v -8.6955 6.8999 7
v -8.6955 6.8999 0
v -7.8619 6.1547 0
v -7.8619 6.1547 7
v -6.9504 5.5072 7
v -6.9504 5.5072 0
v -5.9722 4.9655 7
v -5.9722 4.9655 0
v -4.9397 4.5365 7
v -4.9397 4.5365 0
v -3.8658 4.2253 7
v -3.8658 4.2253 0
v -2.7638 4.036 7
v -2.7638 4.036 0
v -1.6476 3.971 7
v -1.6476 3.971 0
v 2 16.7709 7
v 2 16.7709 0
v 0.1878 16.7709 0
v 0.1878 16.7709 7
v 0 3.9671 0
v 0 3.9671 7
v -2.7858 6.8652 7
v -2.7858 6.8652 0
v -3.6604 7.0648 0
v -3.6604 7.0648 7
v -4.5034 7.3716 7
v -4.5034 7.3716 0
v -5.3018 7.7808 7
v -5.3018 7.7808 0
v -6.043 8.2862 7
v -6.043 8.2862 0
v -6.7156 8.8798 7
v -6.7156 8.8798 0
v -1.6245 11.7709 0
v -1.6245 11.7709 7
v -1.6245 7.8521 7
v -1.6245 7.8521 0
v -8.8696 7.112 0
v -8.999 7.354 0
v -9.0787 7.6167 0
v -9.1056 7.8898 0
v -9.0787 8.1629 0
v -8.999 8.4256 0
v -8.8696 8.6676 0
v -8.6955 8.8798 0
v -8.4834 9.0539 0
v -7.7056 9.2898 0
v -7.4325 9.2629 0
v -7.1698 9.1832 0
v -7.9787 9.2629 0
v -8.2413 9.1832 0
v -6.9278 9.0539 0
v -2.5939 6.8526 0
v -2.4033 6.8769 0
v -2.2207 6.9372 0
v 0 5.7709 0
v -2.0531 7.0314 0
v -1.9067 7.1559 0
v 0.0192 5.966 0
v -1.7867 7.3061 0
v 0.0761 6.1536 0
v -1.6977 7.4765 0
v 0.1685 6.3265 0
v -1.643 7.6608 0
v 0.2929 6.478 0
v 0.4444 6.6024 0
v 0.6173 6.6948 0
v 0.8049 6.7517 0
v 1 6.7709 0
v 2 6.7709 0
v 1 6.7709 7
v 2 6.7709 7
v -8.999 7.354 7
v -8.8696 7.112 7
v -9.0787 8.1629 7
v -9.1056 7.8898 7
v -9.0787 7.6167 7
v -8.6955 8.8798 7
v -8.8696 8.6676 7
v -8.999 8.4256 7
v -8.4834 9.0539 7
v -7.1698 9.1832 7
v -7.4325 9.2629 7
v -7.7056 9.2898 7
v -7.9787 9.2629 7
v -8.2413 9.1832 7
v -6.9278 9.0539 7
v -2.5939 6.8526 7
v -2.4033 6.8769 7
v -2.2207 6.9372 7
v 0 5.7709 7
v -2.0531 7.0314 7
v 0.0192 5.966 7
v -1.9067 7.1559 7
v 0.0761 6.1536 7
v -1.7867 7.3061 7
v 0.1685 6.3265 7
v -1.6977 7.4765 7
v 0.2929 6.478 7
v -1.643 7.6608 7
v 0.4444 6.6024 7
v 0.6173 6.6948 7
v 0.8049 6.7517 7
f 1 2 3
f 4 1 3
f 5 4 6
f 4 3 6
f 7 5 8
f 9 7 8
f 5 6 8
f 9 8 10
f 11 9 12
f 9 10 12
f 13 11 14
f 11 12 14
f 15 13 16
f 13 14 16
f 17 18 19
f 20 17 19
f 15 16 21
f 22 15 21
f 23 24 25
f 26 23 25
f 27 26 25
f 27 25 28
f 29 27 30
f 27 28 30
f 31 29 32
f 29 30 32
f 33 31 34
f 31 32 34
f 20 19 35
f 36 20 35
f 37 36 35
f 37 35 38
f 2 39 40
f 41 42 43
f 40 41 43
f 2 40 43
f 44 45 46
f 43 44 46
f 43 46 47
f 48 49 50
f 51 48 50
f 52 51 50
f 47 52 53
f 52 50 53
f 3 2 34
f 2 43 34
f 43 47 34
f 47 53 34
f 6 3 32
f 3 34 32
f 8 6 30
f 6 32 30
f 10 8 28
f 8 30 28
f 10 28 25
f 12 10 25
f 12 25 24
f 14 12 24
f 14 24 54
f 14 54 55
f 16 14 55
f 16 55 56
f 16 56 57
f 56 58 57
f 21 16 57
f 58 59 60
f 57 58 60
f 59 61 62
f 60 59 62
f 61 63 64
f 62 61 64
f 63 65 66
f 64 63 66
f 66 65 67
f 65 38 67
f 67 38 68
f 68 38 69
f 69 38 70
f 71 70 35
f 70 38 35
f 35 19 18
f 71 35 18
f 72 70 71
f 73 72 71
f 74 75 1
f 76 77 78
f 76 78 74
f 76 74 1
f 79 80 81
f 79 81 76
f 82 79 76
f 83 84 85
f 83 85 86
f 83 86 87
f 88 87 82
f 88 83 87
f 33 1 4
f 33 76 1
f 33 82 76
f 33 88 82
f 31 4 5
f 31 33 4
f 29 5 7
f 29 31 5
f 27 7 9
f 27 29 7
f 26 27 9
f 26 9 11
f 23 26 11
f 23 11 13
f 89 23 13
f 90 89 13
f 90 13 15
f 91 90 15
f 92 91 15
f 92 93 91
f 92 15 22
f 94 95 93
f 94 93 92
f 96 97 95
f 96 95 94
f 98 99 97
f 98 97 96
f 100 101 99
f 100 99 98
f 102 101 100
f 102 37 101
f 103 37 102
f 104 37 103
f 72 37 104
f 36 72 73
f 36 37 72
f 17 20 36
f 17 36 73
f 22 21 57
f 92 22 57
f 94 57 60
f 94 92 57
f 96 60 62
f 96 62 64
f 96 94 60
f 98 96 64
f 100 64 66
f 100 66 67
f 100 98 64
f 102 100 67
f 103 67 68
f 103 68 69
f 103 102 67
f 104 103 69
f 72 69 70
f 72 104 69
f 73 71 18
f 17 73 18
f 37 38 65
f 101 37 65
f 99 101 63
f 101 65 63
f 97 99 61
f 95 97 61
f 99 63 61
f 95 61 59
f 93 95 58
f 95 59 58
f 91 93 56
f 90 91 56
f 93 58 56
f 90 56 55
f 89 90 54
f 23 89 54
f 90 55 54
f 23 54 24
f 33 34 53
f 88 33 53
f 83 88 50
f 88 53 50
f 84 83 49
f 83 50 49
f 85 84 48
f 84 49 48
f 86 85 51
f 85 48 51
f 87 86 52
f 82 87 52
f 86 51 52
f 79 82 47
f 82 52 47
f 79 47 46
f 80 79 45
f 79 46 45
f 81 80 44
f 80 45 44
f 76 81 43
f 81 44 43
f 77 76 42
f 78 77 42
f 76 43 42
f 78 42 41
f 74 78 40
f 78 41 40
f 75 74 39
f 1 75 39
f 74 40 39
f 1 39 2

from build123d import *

# Parameters (mm, degrees)
F1_DEPTH = 7
F2_R     = 1


with BuildPart() as f1:
    # F0 (on Top) → F1 (new body)
    with BuildSketch(Plane.XY):
        with BuildLine():
            Line((0, 3.967148), (0, 6.770925))
            Line((0, 6.770925), (2, 6.770925))
            Line((2, 6.770925), (2, 16.770925))
            Line((2, 16.770925), (0.187763, 16.770925))
            Line((0.187763, 16.770925), (-1.624474, 11.770925))
            Line((-1.624474, 11.770925), (-1.624474, 7.852102))
            ThreePointArc((-1.624474, 7.852102), (-1.976897, 7.090101), (-2.785764, 6.865195))
            ThreePointArc((-2.785764, 6.865195), (-4.908971, 7.563736), (-6.715642, 8.879756))
            Line((-6.715642, 8.879756), (-8.695541, 6.899857))
            ThreePointArc((-8.695541, 6.899857), (-5.461971, 4.736554), (-1.647563, 3.970952))
            Line((-1.647563, 3.970952), (0, 3.967148))
        make_face()
        with BuildLine():
            ThreePointArc((-6.715642, 8.879756), (-8.695541, 8.879756), (-8.695541, 6.899857))
            Line((-8.695541, 6.899857), (-6.715642, 8.879756))
        make_face()
    extrude(amount=F1_DEPTH)

    # F2
    f2_edges = [f1.edges().sort_by_distance(p)[0] for p in [
        (0, 6.770925, 3.5),
    ]]
    fillet(f2_edges, radius=F2_R)


solid = f1.part
